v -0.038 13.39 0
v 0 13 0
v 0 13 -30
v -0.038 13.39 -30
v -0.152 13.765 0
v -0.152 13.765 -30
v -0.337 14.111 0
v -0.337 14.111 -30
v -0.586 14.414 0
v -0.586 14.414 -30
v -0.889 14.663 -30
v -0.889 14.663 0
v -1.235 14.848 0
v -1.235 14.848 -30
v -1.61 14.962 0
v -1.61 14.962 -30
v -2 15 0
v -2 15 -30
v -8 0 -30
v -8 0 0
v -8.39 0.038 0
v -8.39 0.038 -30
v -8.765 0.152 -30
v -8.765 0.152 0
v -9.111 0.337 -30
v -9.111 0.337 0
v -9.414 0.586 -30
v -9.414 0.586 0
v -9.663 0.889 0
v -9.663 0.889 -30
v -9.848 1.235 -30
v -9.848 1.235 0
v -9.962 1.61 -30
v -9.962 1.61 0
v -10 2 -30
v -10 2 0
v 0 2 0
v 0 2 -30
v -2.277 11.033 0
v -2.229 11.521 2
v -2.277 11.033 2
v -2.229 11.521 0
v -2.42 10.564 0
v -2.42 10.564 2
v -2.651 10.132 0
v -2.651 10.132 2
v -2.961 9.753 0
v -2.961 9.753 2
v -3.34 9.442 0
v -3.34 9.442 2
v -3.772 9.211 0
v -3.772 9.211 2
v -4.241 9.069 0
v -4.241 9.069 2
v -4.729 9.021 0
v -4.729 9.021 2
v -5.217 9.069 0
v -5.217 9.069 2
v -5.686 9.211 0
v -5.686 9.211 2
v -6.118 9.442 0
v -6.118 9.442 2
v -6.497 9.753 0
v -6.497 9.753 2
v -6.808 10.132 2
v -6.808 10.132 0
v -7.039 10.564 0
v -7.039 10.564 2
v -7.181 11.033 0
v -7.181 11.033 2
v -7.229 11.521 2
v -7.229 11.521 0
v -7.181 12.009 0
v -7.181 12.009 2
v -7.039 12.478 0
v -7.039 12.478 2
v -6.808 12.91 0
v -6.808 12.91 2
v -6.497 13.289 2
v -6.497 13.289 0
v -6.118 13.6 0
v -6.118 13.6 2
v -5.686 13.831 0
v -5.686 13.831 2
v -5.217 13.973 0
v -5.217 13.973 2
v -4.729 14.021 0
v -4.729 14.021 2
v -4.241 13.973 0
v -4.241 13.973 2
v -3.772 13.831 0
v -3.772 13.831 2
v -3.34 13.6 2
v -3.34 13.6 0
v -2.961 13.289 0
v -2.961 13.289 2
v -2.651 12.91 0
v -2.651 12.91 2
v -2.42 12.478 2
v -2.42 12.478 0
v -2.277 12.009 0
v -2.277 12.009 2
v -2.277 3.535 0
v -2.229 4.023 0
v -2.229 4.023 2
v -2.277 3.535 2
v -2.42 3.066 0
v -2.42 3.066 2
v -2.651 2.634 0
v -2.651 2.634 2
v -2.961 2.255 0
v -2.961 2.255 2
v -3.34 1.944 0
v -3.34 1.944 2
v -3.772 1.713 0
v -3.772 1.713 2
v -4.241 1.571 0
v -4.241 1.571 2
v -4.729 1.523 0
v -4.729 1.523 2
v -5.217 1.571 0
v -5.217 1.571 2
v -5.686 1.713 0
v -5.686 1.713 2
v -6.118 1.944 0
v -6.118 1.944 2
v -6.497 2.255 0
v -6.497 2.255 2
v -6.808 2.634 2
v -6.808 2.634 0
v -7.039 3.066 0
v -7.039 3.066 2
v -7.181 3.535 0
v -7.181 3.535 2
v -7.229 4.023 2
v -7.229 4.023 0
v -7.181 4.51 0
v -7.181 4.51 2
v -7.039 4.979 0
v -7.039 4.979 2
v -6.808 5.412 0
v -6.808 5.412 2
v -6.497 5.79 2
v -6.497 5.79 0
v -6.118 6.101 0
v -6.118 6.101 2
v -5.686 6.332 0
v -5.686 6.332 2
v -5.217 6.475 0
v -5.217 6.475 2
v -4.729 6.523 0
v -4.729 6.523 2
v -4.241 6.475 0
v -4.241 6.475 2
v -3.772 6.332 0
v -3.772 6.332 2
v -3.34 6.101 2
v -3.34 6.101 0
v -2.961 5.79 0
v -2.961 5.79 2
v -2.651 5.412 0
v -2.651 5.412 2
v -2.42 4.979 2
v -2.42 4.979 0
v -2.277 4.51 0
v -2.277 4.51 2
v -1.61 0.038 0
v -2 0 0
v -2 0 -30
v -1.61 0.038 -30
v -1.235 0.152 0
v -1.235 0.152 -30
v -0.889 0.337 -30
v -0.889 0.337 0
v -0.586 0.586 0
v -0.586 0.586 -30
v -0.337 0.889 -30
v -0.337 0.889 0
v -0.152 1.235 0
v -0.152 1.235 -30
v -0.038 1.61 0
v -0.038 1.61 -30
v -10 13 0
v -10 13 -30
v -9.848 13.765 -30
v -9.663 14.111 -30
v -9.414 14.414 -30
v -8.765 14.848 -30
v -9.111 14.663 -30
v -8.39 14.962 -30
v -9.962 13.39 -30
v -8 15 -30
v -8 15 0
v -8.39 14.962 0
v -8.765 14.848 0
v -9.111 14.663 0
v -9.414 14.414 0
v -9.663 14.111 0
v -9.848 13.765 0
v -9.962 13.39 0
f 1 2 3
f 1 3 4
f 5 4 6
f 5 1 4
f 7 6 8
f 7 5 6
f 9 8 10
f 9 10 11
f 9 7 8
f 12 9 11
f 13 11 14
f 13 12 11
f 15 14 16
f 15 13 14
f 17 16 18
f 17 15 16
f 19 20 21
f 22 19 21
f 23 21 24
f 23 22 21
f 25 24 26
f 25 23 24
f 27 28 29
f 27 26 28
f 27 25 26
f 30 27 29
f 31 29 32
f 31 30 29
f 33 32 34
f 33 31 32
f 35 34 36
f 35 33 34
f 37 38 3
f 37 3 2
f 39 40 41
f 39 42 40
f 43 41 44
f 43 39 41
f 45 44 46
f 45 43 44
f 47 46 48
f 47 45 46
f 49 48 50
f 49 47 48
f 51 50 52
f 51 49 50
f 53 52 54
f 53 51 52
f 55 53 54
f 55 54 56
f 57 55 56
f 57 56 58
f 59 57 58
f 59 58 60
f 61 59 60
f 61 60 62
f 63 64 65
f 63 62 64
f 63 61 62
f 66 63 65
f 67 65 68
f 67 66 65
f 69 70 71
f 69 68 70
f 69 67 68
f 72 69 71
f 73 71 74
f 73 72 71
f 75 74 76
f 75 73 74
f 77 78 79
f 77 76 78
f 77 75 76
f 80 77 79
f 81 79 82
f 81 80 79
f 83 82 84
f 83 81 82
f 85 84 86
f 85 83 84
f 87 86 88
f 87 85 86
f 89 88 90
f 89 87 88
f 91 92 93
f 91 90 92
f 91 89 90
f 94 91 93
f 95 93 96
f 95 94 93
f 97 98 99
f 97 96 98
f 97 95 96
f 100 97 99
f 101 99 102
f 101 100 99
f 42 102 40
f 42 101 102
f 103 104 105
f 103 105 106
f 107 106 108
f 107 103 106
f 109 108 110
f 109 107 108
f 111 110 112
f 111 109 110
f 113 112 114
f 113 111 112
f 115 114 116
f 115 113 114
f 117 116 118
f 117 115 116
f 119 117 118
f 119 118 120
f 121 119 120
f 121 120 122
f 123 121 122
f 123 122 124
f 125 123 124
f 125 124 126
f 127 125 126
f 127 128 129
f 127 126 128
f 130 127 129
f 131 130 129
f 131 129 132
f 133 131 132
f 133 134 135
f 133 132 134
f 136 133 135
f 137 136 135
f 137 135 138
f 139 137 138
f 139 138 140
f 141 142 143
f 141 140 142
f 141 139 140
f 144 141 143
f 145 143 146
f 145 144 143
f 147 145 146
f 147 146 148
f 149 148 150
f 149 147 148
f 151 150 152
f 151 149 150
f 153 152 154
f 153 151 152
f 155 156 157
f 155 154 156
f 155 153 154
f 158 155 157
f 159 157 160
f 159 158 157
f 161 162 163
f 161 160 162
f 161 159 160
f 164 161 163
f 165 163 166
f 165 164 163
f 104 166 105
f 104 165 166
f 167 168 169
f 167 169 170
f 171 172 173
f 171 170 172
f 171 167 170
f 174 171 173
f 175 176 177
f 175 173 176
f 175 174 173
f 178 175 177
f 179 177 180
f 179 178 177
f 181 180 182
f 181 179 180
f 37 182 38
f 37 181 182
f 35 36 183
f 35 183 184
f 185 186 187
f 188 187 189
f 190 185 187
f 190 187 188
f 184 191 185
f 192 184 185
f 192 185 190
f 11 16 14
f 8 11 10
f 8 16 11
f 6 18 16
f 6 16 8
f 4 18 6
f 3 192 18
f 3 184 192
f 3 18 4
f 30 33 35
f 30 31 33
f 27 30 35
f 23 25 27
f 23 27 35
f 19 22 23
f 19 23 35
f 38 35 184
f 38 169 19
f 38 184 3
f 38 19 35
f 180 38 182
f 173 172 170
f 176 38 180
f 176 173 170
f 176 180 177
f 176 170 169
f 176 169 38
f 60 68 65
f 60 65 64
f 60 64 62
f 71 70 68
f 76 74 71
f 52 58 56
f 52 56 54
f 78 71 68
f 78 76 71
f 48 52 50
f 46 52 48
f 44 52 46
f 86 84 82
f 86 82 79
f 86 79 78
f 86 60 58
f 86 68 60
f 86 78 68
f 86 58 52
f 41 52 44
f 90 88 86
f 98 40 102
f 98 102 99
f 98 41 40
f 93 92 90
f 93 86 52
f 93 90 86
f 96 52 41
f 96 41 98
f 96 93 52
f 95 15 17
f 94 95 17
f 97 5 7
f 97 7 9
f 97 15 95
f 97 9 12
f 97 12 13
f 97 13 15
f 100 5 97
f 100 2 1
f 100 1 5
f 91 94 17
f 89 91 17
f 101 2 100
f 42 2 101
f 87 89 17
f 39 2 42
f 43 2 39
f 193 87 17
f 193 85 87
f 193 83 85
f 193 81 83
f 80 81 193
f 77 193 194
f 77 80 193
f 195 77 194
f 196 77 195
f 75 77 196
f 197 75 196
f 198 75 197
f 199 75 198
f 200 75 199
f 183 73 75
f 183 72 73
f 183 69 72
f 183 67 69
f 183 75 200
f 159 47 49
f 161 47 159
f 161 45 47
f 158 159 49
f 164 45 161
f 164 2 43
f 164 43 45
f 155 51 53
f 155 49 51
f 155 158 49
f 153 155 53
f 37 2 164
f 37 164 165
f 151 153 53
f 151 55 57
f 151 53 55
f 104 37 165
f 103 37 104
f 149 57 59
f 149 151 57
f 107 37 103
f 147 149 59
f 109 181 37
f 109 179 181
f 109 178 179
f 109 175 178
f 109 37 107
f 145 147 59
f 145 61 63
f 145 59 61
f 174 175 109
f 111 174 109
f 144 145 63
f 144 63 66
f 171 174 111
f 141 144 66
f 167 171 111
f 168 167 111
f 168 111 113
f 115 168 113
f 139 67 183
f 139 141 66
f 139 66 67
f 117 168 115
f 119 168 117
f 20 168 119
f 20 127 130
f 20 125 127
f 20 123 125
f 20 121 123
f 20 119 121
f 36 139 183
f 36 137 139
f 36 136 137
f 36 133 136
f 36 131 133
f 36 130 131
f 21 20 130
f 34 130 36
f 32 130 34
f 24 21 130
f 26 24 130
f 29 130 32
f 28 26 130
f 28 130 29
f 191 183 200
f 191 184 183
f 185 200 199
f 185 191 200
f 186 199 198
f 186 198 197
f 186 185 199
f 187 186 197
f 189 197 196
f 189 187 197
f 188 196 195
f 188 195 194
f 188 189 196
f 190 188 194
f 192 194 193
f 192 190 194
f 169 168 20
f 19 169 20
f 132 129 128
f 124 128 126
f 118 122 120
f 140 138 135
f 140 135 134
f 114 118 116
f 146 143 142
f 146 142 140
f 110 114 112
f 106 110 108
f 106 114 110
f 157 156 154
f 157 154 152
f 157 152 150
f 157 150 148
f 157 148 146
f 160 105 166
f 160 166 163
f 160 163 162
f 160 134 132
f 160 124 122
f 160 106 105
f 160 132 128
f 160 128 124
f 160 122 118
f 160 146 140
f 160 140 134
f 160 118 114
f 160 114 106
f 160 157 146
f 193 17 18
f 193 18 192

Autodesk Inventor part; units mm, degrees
ref_plane "YZ Plane" through (0, 0, 0) normal (1, 0, 0) x (0, 1, 0)
ref_plane "XZ Plane" through (0, 0, 0) normal (0, 1, 0) x (-1, 0, 0)
ref_plane "XY Plane" through (0, 0, 0) normal (0, 0, 1) x (1, 0, 0)
sketch "Sketch1" plane through (0, 0, 0) normal (0, 1, 0) x (-1, 0, 0)
  point P0 (0, 0)
sketch "Sketch2" plane through (0, 0, 0) normal (0, 1, 0) x (-1, 0, 0)
  line L0 (0, 0) -> (10, 0)
  line L1 (10, 0) -> (10, -30)
  line L2 (10, -30) -> (0, -30)
  line L3 (0, -30) -> (0, 0)
  dimension "d0" = 10
  dimension "d1" = 30
extrude "Extrusion1" add sketch "Sketch2" along normal blind 15
fillet "Fillet1" radius 2 4 edges at (0, 15, -15) (-10, 15, -15) (0, 0, -15) (-10, 0, -15)
sketch "Sketch3" plane through (-8, 0, 0) normal (0, 0, 1) x (1, 0, 0)
  circle A0 centre (3.2708, 11.5209) radius 2.5
  circle A1 centre (3.2708, 4.0226) radius 2.5
  point P0 (8, 0)
  dimension "d5" = 5
  dimension "d6" = 5
extrude "Extrusion2" add sketch "Sketch3" along normal blind 2
properties part number "battery"
